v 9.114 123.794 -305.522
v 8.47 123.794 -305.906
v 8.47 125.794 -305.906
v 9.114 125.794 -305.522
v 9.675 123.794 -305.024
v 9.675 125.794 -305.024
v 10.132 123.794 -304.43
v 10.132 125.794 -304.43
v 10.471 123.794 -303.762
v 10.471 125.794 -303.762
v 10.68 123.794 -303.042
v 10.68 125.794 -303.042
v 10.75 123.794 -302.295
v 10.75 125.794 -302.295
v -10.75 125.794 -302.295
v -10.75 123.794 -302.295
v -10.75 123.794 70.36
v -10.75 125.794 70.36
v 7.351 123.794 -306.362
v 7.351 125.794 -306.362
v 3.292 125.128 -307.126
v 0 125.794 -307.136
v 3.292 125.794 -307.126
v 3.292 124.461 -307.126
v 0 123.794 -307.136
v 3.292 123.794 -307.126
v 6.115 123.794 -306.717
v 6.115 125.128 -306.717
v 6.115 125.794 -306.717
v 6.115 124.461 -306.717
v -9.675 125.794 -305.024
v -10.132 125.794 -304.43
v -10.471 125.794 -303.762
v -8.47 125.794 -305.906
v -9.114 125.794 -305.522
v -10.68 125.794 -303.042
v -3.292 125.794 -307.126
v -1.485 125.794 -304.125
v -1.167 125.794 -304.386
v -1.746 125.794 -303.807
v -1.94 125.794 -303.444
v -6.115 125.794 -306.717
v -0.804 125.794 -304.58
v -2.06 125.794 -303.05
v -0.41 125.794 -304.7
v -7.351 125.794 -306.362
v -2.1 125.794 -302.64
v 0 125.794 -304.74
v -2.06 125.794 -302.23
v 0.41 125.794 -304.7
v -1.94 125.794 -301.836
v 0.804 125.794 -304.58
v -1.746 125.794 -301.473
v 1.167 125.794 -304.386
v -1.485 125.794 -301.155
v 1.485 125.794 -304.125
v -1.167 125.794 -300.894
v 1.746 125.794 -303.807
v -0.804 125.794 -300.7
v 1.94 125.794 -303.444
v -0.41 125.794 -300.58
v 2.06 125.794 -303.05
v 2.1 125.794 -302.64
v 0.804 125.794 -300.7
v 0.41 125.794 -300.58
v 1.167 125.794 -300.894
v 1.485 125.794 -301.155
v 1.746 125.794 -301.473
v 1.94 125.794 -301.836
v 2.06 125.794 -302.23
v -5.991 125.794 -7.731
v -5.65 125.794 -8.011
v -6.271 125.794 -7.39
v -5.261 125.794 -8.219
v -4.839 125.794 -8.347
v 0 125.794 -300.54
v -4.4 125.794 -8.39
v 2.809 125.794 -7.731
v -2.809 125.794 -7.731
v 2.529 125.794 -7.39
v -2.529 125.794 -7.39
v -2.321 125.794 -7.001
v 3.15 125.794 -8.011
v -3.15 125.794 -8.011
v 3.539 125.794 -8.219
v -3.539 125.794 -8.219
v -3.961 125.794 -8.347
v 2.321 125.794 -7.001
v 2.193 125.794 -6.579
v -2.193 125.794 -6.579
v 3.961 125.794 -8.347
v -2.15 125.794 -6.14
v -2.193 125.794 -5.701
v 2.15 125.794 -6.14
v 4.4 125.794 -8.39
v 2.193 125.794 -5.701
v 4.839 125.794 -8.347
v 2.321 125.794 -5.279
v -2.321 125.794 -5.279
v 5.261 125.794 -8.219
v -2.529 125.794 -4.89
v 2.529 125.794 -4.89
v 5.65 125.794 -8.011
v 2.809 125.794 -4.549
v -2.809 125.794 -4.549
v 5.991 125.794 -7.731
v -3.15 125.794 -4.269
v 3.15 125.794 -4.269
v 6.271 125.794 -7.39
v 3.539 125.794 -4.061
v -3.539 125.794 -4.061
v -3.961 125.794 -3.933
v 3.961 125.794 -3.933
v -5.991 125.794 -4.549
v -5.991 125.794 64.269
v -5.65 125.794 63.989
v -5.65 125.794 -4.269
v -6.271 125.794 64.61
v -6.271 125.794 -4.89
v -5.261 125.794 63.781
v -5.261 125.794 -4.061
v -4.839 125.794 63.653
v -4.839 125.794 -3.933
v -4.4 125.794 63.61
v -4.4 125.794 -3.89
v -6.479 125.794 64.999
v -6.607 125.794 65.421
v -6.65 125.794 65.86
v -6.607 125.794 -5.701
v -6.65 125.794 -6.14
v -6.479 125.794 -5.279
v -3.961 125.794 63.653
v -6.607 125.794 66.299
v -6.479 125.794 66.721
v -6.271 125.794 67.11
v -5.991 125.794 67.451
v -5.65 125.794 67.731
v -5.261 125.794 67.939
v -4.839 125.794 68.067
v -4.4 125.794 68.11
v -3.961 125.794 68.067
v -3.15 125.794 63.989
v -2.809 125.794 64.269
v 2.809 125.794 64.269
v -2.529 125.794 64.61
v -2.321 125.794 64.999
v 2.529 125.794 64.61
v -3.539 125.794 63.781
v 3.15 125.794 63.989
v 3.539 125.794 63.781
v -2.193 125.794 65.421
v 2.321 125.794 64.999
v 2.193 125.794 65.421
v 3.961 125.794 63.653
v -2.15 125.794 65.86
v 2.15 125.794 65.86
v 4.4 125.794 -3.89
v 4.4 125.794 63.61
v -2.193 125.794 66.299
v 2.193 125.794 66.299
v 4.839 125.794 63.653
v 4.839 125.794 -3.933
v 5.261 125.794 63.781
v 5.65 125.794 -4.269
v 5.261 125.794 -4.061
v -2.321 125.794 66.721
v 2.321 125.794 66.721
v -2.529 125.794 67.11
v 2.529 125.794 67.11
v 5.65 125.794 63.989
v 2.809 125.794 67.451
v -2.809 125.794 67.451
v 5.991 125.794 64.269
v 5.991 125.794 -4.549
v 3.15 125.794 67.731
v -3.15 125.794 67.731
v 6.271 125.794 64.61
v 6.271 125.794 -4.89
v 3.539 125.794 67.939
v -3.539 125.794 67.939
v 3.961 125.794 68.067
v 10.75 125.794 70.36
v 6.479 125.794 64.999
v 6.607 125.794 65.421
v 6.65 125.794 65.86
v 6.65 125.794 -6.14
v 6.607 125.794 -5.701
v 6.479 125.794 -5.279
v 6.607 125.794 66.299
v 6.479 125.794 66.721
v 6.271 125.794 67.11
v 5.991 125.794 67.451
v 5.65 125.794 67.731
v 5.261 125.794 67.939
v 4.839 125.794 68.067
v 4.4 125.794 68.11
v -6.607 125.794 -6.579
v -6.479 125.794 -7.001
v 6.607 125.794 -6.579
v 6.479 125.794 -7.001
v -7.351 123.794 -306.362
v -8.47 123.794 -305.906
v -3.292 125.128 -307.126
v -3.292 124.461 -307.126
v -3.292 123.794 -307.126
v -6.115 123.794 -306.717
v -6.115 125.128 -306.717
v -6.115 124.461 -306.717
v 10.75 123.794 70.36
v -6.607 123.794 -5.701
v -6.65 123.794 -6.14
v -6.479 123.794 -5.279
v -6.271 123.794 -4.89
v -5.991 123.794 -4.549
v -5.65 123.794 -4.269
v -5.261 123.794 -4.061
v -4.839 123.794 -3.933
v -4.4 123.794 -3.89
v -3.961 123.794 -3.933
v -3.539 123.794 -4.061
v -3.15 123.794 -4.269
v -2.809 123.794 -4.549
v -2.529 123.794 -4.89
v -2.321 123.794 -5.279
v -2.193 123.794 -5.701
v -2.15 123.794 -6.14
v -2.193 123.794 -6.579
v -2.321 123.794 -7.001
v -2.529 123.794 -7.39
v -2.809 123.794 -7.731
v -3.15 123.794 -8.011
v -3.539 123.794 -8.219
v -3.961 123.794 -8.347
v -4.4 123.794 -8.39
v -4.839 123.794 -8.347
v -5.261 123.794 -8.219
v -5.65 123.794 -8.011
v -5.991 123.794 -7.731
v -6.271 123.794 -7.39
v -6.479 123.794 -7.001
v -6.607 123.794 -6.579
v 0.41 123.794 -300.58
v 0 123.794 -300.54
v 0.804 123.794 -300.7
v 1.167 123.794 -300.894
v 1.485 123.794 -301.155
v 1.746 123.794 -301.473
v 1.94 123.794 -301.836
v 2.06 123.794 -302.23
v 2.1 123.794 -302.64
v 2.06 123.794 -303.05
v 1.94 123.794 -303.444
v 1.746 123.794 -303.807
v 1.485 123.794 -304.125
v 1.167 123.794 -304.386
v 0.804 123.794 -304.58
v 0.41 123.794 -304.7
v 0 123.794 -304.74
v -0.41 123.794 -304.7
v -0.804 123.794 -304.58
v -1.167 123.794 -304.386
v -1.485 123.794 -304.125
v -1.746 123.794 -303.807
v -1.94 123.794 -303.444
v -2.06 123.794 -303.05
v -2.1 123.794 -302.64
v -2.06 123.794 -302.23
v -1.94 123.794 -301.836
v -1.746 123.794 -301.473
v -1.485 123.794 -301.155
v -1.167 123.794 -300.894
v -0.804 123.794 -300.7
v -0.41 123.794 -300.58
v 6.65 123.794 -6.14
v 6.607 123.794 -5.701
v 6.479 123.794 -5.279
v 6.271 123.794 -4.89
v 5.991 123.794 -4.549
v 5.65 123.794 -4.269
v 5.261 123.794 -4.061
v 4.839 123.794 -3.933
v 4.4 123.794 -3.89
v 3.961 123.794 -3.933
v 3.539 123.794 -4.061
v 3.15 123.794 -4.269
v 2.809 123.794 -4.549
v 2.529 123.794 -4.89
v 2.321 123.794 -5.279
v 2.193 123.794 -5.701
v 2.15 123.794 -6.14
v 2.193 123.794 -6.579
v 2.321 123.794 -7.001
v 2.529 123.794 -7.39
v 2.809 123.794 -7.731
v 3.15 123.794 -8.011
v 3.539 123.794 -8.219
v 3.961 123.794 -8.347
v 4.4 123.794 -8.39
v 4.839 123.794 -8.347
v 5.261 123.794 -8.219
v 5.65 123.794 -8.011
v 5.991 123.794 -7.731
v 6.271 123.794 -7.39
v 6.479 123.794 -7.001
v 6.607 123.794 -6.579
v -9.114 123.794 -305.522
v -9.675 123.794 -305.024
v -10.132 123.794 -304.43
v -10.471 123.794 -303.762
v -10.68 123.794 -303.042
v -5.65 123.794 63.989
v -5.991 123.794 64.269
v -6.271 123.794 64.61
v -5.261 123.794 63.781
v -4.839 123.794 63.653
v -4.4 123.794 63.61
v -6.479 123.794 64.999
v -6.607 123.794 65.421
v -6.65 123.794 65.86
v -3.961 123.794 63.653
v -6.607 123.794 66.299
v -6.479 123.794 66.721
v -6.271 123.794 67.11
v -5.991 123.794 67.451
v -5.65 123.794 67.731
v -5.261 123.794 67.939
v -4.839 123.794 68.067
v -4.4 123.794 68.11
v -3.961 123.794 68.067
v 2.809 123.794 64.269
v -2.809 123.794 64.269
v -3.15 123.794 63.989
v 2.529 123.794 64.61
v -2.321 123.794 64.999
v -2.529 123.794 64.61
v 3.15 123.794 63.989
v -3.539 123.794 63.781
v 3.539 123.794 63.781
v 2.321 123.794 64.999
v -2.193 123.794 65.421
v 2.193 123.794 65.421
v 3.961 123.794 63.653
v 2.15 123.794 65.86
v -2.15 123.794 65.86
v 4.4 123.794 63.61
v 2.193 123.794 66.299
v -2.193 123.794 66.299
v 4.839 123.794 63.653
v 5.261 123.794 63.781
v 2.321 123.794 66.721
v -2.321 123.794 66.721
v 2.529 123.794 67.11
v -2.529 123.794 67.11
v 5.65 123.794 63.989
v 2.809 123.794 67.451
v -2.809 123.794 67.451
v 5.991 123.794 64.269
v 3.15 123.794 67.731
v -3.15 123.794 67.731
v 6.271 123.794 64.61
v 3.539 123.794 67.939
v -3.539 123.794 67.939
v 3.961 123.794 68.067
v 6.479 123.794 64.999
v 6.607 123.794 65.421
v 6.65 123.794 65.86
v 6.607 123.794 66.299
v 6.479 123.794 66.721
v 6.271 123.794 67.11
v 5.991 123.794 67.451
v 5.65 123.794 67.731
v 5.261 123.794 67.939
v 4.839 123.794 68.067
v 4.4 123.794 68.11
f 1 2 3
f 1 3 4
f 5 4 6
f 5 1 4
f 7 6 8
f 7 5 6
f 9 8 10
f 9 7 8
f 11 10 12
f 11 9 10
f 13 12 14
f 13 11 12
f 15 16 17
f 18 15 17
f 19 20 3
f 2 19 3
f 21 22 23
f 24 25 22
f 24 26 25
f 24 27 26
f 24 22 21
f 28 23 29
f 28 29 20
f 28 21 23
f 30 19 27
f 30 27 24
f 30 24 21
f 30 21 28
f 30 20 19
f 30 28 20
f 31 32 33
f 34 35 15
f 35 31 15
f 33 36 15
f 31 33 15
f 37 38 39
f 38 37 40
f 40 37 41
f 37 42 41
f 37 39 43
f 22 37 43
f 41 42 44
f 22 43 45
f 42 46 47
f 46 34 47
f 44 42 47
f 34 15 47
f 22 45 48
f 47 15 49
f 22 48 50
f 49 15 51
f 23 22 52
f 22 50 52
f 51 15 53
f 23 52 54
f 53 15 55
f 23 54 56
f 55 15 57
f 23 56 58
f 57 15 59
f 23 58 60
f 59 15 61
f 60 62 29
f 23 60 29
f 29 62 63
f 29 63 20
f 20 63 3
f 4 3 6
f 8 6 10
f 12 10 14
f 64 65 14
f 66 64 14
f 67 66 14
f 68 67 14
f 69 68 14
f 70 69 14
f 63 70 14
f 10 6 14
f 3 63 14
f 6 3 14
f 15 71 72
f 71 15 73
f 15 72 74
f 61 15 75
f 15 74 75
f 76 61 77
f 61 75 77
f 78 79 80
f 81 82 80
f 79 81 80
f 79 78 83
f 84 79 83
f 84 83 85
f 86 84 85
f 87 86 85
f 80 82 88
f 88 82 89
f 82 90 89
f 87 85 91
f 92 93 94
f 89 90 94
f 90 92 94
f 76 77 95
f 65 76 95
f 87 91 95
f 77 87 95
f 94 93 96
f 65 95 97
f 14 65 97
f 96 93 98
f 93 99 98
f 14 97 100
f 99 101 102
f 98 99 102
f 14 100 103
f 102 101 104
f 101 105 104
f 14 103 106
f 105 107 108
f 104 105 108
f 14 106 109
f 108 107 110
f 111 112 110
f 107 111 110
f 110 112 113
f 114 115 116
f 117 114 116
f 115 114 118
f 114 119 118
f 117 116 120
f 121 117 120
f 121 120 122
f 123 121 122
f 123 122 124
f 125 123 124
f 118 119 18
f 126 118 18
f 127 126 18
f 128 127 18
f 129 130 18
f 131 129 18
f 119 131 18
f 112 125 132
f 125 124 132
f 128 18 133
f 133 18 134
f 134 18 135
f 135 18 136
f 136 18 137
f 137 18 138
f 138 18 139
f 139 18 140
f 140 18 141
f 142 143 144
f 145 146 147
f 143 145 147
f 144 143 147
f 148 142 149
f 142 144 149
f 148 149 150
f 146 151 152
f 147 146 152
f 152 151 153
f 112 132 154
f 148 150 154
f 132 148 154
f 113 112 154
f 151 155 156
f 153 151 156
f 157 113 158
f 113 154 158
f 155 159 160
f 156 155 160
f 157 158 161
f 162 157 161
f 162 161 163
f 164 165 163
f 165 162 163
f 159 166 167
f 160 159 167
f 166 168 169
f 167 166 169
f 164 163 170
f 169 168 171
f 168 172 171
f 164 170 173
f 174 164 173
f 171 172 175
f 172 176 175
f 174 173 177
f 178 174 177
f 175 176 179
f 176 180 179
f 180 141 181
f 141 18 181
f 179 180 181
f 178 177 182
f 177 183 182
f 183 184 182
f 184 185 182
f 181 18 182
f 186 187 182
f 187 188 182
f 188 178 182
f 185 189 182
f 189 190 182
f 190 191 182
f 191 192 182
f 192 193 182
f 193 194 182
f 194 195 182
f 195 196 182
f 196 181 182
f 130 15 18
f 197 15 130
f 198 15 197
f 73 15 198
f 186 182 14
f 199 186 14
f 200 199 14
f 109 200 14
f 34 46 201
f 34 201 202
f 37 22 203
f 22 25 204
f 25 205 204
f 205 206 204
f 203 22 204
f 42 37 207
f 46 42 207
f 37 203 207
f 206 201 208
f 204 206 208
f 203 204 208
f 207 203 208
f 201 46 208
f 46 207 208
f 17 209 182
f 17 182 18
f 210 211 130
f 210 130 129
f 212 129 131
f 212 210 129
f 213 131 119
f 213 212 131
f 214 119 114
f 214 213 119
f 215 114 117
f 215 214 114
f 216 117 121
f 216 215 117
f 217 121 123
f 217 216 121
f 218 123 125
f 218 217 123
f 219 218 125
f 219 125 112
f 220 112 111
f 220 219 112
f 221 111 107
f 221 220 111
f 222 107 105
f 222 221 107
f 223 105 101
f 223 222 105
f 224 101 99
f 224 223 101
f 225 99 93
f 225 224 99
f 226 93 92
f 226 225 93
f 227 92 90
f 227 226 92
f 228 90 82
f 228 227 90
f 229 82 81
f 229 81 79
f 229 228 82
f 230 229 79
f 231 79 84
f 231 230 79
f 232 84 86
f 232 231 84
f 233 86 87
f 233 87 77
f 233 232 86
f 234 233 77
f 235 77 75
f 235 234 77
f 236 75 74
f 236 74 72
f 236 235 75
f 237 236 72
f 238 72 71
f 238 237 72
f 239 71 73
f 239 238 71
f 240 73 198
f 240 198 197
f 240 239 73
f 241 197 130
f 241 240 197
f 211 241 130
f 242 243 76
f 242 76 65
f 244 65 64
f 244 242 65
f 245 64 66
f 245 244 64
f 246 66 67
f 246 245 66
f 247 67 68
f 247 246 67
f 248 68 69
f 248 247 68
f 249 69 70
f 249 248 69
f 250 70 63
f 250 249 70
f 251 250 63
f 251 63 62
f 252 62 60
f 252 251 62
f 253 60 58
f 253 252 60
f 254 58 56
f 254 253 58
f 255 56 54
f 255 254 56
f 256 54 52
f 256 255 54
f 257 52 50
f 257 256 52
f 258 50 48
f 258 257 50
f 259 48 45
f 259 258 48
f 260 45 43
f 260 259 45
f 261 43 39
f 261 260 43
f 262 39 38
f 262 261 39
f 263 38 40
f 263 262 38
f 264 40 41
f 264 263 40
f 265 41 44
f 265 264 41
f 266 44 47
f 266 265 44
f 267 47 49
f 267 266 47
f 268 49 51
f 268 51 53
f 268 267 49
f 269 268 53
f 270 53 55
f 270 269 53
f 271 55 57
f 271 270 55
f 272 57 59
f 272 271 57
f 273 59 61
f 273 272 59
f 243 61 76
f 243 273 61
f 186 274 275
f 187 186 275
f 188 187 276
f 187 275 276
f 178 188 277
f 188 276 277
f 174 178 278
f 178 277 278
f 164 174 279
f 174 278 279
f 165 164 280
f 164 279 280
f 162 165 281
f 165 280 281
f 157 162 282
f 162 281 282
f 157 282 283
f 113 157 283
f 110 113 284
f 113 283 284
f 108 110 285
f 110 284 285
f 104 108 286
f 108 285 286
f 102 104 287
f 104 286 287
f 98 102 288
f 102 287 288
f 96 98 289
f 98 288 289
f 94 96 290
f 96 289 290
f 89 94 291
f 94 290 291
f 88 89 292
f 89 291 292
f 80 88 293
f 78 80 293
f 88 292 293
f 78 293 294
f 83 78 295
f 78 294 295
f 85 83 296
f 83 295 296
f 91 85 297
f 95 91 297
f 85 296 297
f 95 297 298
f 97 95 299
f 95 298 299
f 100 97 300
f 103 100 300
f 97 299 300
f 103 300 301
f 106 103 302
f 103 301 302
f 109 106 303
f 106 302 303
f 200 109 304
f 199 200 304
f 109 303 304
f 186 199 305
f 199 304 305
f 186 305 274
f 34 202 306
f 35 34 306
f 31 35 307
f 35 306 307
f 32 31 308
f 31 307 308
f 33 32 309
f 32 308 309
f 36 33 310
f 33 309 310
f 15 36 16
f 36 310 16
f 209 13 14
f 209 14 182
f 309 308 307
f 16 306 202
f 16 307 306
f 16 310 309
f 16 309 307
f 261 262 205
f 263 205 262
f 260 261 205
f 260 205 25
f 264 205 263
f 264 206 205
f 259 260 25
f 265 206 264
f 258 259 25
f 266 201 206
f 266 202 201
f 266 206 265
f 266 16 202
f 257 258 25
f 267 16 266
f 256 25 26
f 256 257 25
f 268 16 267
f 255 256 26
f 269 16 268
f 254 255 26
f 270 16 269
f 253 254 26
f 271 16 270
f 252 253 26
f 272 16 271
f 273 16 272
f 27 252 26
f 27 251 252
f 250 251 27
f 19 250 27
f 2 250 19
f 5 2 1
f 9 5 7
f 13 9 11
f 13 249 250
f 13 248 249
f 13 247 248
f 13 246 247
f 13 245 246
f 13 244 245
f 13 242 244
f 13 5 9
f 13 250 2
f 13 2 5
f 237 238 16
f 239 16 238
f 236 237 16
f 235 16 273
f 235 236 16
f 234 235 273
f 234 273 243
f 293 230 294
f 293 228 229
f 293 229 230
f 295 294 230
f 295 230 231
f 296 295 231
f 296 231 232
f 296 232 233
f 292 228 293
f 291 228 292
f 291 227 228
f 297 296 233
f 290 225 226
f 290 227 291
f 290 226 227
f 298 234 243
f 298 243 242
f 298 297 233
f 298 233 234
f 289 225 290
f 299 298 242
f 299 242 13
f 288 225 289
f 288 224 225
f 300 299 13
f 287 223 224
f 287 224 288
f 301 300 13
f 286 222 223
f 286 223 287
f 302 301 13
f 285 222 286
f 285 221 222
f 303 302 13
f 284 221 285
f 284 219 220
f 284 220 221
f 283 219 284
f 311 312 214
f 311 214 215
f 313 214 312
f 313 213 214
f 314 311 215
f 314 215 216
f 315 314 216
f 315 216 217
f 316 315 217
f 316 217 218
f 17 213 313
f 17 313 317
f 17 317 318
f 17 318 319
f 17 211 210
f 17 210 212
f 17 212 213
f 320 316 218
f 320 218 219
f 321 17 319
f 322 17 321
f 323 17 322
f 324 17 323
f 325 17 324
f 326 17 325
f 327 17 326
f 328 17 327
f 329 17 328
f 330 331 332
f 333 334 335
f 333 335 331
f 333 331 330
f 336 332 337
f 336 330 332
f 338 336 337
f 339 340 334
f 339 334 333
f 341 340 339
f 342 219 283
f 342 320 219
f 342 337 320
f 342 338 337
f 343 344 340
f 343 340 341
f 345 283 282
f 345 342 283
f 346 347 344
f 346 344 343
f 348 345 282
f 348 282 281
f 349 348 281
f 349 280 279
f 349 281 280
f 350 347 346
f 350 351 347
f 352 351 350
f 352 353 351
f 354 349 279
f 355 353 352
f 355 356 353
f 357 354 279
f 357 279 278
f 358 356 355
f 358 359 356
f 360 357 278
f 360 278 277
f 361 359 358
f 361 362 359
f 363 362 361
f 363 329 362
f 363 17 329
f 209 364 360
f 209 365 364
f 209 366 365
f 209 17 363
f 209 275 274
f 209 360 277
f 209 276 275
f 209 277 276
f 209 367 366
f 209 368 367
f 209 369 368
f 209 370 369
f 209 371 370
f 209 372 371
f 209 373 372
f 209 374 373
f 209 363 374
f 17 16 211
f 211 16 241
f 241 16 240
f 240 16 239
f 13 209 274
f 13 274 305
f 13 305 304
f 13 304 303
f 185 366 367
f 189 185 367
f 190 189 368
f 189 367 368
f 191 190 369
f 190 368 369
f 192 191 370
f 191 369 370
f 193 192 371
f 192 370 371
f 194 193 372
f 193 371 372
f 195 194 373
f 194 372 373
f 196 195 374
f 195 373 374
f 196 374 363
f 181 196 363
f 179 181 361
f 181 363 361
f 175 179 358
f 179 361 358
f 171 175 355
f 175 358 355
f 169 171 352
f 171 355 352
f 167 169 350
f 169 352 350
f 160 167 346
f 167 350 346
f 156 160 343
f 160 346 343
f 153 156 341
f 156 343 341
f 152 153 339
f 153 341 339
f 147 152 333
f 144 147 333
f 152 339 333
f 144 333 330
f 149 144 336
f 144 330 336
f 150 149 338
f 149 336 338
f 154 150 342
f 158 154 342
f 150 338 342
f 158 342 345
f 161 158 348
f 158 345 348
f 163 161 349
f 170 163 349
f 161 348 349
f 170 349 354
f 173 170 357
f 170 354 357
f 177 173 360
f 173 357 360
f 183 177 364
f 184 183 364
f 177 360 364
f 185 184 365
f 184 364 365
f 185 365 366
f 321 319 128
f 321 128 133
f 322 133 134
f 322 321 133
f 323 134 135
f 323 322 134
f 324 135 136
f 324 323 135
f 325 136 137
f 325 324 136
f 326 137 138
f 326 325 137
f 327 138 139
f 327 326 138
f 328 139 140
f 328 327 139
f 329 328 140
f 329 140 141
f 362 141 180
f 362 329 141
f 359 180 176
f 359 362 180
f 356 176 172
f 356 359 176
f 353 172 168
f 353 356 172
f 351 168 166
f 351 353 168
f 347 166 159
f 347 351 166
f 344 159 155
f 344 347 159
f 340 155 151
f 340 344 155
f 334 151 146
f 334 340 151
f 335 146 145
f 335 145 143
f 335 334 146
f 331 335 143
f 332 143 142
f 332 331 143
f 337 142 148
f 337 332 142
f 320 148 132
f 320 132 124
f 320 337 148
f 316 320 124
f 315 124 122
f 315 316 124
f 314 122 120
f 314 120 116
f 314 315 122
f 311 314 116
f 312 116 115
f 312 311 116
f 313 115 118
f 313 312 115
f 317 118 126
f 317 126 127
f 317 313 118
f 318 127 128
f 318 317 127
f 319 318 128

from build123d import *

# Parameters (mm, degrees)
SKETCH3_R           = 2.25
BOSS_EXTRUDE2_DEPTH = 2


with BuildPart() as part:
    # Sketch3 → Boss-Extrude2 (new body)
    with BuildSketch(Plane(origin=(0, 123.794401912, 0), x_dir=(-1, 0, 0), z_dir=(0, 1, 0))):
        with BuildLine():
            Line((0, -40), (0, -245))
            Line((0, -245), (0, -300.54))
            ThreePointArc((0, -300.54), (2.1, -302.64), (0, -304.74))
            Line((0, -304.74), (0, -307.135677029))
            add(Edge.make_bspline(
                [(0, -307.135677029), (3.525787284, -307.326518028), (6.349200001, -306.916747925), (8.470238152, -305.906366718)],
                knots=[0, 0, 0, 0, 0.308955345, 0.308955345, 0.308955345, 0.308955345], degree=3))
            ThreePointArc((8.470238152, -305.906366718), (10.132377315, -304.430468728), (10.75, -302.295164605))
            Line((10.75, -302.295164605), (10.75, -284.460908409))
            Line((10.75, -284.460908409), (10.75, -40))
            Line((10.75, -40), (10.75, 40))
            Line((10.75, 40), (10.75, 70.36))
            Line((10.75, 70.36), (0, 70.36))
            Line((0, 70.36), (0, 40))
            Line((0, 40), (0, -40))
        make_face()
        with Locations((4.4, -6.14)):
            Circle(SKETCH3_R, mode=Mode.SUBTRACT)
        with Locations((4.4, 65.86)):
            Circle(SKETCH3_R, mode=Mode.SUBTRACT)
    extrude(amount=BOSS_EXTRUDE2_DEPTH)

    # Mirror10: part across face


with BuildPart() as part_1:
    add(part.part)
    add(part.part.mirror(Plane(origin=(0, 124.794401912, -115.09), x_dir=(0, 0, 1), z_dir=(1, 0, 0))))


solid = part_1.part
